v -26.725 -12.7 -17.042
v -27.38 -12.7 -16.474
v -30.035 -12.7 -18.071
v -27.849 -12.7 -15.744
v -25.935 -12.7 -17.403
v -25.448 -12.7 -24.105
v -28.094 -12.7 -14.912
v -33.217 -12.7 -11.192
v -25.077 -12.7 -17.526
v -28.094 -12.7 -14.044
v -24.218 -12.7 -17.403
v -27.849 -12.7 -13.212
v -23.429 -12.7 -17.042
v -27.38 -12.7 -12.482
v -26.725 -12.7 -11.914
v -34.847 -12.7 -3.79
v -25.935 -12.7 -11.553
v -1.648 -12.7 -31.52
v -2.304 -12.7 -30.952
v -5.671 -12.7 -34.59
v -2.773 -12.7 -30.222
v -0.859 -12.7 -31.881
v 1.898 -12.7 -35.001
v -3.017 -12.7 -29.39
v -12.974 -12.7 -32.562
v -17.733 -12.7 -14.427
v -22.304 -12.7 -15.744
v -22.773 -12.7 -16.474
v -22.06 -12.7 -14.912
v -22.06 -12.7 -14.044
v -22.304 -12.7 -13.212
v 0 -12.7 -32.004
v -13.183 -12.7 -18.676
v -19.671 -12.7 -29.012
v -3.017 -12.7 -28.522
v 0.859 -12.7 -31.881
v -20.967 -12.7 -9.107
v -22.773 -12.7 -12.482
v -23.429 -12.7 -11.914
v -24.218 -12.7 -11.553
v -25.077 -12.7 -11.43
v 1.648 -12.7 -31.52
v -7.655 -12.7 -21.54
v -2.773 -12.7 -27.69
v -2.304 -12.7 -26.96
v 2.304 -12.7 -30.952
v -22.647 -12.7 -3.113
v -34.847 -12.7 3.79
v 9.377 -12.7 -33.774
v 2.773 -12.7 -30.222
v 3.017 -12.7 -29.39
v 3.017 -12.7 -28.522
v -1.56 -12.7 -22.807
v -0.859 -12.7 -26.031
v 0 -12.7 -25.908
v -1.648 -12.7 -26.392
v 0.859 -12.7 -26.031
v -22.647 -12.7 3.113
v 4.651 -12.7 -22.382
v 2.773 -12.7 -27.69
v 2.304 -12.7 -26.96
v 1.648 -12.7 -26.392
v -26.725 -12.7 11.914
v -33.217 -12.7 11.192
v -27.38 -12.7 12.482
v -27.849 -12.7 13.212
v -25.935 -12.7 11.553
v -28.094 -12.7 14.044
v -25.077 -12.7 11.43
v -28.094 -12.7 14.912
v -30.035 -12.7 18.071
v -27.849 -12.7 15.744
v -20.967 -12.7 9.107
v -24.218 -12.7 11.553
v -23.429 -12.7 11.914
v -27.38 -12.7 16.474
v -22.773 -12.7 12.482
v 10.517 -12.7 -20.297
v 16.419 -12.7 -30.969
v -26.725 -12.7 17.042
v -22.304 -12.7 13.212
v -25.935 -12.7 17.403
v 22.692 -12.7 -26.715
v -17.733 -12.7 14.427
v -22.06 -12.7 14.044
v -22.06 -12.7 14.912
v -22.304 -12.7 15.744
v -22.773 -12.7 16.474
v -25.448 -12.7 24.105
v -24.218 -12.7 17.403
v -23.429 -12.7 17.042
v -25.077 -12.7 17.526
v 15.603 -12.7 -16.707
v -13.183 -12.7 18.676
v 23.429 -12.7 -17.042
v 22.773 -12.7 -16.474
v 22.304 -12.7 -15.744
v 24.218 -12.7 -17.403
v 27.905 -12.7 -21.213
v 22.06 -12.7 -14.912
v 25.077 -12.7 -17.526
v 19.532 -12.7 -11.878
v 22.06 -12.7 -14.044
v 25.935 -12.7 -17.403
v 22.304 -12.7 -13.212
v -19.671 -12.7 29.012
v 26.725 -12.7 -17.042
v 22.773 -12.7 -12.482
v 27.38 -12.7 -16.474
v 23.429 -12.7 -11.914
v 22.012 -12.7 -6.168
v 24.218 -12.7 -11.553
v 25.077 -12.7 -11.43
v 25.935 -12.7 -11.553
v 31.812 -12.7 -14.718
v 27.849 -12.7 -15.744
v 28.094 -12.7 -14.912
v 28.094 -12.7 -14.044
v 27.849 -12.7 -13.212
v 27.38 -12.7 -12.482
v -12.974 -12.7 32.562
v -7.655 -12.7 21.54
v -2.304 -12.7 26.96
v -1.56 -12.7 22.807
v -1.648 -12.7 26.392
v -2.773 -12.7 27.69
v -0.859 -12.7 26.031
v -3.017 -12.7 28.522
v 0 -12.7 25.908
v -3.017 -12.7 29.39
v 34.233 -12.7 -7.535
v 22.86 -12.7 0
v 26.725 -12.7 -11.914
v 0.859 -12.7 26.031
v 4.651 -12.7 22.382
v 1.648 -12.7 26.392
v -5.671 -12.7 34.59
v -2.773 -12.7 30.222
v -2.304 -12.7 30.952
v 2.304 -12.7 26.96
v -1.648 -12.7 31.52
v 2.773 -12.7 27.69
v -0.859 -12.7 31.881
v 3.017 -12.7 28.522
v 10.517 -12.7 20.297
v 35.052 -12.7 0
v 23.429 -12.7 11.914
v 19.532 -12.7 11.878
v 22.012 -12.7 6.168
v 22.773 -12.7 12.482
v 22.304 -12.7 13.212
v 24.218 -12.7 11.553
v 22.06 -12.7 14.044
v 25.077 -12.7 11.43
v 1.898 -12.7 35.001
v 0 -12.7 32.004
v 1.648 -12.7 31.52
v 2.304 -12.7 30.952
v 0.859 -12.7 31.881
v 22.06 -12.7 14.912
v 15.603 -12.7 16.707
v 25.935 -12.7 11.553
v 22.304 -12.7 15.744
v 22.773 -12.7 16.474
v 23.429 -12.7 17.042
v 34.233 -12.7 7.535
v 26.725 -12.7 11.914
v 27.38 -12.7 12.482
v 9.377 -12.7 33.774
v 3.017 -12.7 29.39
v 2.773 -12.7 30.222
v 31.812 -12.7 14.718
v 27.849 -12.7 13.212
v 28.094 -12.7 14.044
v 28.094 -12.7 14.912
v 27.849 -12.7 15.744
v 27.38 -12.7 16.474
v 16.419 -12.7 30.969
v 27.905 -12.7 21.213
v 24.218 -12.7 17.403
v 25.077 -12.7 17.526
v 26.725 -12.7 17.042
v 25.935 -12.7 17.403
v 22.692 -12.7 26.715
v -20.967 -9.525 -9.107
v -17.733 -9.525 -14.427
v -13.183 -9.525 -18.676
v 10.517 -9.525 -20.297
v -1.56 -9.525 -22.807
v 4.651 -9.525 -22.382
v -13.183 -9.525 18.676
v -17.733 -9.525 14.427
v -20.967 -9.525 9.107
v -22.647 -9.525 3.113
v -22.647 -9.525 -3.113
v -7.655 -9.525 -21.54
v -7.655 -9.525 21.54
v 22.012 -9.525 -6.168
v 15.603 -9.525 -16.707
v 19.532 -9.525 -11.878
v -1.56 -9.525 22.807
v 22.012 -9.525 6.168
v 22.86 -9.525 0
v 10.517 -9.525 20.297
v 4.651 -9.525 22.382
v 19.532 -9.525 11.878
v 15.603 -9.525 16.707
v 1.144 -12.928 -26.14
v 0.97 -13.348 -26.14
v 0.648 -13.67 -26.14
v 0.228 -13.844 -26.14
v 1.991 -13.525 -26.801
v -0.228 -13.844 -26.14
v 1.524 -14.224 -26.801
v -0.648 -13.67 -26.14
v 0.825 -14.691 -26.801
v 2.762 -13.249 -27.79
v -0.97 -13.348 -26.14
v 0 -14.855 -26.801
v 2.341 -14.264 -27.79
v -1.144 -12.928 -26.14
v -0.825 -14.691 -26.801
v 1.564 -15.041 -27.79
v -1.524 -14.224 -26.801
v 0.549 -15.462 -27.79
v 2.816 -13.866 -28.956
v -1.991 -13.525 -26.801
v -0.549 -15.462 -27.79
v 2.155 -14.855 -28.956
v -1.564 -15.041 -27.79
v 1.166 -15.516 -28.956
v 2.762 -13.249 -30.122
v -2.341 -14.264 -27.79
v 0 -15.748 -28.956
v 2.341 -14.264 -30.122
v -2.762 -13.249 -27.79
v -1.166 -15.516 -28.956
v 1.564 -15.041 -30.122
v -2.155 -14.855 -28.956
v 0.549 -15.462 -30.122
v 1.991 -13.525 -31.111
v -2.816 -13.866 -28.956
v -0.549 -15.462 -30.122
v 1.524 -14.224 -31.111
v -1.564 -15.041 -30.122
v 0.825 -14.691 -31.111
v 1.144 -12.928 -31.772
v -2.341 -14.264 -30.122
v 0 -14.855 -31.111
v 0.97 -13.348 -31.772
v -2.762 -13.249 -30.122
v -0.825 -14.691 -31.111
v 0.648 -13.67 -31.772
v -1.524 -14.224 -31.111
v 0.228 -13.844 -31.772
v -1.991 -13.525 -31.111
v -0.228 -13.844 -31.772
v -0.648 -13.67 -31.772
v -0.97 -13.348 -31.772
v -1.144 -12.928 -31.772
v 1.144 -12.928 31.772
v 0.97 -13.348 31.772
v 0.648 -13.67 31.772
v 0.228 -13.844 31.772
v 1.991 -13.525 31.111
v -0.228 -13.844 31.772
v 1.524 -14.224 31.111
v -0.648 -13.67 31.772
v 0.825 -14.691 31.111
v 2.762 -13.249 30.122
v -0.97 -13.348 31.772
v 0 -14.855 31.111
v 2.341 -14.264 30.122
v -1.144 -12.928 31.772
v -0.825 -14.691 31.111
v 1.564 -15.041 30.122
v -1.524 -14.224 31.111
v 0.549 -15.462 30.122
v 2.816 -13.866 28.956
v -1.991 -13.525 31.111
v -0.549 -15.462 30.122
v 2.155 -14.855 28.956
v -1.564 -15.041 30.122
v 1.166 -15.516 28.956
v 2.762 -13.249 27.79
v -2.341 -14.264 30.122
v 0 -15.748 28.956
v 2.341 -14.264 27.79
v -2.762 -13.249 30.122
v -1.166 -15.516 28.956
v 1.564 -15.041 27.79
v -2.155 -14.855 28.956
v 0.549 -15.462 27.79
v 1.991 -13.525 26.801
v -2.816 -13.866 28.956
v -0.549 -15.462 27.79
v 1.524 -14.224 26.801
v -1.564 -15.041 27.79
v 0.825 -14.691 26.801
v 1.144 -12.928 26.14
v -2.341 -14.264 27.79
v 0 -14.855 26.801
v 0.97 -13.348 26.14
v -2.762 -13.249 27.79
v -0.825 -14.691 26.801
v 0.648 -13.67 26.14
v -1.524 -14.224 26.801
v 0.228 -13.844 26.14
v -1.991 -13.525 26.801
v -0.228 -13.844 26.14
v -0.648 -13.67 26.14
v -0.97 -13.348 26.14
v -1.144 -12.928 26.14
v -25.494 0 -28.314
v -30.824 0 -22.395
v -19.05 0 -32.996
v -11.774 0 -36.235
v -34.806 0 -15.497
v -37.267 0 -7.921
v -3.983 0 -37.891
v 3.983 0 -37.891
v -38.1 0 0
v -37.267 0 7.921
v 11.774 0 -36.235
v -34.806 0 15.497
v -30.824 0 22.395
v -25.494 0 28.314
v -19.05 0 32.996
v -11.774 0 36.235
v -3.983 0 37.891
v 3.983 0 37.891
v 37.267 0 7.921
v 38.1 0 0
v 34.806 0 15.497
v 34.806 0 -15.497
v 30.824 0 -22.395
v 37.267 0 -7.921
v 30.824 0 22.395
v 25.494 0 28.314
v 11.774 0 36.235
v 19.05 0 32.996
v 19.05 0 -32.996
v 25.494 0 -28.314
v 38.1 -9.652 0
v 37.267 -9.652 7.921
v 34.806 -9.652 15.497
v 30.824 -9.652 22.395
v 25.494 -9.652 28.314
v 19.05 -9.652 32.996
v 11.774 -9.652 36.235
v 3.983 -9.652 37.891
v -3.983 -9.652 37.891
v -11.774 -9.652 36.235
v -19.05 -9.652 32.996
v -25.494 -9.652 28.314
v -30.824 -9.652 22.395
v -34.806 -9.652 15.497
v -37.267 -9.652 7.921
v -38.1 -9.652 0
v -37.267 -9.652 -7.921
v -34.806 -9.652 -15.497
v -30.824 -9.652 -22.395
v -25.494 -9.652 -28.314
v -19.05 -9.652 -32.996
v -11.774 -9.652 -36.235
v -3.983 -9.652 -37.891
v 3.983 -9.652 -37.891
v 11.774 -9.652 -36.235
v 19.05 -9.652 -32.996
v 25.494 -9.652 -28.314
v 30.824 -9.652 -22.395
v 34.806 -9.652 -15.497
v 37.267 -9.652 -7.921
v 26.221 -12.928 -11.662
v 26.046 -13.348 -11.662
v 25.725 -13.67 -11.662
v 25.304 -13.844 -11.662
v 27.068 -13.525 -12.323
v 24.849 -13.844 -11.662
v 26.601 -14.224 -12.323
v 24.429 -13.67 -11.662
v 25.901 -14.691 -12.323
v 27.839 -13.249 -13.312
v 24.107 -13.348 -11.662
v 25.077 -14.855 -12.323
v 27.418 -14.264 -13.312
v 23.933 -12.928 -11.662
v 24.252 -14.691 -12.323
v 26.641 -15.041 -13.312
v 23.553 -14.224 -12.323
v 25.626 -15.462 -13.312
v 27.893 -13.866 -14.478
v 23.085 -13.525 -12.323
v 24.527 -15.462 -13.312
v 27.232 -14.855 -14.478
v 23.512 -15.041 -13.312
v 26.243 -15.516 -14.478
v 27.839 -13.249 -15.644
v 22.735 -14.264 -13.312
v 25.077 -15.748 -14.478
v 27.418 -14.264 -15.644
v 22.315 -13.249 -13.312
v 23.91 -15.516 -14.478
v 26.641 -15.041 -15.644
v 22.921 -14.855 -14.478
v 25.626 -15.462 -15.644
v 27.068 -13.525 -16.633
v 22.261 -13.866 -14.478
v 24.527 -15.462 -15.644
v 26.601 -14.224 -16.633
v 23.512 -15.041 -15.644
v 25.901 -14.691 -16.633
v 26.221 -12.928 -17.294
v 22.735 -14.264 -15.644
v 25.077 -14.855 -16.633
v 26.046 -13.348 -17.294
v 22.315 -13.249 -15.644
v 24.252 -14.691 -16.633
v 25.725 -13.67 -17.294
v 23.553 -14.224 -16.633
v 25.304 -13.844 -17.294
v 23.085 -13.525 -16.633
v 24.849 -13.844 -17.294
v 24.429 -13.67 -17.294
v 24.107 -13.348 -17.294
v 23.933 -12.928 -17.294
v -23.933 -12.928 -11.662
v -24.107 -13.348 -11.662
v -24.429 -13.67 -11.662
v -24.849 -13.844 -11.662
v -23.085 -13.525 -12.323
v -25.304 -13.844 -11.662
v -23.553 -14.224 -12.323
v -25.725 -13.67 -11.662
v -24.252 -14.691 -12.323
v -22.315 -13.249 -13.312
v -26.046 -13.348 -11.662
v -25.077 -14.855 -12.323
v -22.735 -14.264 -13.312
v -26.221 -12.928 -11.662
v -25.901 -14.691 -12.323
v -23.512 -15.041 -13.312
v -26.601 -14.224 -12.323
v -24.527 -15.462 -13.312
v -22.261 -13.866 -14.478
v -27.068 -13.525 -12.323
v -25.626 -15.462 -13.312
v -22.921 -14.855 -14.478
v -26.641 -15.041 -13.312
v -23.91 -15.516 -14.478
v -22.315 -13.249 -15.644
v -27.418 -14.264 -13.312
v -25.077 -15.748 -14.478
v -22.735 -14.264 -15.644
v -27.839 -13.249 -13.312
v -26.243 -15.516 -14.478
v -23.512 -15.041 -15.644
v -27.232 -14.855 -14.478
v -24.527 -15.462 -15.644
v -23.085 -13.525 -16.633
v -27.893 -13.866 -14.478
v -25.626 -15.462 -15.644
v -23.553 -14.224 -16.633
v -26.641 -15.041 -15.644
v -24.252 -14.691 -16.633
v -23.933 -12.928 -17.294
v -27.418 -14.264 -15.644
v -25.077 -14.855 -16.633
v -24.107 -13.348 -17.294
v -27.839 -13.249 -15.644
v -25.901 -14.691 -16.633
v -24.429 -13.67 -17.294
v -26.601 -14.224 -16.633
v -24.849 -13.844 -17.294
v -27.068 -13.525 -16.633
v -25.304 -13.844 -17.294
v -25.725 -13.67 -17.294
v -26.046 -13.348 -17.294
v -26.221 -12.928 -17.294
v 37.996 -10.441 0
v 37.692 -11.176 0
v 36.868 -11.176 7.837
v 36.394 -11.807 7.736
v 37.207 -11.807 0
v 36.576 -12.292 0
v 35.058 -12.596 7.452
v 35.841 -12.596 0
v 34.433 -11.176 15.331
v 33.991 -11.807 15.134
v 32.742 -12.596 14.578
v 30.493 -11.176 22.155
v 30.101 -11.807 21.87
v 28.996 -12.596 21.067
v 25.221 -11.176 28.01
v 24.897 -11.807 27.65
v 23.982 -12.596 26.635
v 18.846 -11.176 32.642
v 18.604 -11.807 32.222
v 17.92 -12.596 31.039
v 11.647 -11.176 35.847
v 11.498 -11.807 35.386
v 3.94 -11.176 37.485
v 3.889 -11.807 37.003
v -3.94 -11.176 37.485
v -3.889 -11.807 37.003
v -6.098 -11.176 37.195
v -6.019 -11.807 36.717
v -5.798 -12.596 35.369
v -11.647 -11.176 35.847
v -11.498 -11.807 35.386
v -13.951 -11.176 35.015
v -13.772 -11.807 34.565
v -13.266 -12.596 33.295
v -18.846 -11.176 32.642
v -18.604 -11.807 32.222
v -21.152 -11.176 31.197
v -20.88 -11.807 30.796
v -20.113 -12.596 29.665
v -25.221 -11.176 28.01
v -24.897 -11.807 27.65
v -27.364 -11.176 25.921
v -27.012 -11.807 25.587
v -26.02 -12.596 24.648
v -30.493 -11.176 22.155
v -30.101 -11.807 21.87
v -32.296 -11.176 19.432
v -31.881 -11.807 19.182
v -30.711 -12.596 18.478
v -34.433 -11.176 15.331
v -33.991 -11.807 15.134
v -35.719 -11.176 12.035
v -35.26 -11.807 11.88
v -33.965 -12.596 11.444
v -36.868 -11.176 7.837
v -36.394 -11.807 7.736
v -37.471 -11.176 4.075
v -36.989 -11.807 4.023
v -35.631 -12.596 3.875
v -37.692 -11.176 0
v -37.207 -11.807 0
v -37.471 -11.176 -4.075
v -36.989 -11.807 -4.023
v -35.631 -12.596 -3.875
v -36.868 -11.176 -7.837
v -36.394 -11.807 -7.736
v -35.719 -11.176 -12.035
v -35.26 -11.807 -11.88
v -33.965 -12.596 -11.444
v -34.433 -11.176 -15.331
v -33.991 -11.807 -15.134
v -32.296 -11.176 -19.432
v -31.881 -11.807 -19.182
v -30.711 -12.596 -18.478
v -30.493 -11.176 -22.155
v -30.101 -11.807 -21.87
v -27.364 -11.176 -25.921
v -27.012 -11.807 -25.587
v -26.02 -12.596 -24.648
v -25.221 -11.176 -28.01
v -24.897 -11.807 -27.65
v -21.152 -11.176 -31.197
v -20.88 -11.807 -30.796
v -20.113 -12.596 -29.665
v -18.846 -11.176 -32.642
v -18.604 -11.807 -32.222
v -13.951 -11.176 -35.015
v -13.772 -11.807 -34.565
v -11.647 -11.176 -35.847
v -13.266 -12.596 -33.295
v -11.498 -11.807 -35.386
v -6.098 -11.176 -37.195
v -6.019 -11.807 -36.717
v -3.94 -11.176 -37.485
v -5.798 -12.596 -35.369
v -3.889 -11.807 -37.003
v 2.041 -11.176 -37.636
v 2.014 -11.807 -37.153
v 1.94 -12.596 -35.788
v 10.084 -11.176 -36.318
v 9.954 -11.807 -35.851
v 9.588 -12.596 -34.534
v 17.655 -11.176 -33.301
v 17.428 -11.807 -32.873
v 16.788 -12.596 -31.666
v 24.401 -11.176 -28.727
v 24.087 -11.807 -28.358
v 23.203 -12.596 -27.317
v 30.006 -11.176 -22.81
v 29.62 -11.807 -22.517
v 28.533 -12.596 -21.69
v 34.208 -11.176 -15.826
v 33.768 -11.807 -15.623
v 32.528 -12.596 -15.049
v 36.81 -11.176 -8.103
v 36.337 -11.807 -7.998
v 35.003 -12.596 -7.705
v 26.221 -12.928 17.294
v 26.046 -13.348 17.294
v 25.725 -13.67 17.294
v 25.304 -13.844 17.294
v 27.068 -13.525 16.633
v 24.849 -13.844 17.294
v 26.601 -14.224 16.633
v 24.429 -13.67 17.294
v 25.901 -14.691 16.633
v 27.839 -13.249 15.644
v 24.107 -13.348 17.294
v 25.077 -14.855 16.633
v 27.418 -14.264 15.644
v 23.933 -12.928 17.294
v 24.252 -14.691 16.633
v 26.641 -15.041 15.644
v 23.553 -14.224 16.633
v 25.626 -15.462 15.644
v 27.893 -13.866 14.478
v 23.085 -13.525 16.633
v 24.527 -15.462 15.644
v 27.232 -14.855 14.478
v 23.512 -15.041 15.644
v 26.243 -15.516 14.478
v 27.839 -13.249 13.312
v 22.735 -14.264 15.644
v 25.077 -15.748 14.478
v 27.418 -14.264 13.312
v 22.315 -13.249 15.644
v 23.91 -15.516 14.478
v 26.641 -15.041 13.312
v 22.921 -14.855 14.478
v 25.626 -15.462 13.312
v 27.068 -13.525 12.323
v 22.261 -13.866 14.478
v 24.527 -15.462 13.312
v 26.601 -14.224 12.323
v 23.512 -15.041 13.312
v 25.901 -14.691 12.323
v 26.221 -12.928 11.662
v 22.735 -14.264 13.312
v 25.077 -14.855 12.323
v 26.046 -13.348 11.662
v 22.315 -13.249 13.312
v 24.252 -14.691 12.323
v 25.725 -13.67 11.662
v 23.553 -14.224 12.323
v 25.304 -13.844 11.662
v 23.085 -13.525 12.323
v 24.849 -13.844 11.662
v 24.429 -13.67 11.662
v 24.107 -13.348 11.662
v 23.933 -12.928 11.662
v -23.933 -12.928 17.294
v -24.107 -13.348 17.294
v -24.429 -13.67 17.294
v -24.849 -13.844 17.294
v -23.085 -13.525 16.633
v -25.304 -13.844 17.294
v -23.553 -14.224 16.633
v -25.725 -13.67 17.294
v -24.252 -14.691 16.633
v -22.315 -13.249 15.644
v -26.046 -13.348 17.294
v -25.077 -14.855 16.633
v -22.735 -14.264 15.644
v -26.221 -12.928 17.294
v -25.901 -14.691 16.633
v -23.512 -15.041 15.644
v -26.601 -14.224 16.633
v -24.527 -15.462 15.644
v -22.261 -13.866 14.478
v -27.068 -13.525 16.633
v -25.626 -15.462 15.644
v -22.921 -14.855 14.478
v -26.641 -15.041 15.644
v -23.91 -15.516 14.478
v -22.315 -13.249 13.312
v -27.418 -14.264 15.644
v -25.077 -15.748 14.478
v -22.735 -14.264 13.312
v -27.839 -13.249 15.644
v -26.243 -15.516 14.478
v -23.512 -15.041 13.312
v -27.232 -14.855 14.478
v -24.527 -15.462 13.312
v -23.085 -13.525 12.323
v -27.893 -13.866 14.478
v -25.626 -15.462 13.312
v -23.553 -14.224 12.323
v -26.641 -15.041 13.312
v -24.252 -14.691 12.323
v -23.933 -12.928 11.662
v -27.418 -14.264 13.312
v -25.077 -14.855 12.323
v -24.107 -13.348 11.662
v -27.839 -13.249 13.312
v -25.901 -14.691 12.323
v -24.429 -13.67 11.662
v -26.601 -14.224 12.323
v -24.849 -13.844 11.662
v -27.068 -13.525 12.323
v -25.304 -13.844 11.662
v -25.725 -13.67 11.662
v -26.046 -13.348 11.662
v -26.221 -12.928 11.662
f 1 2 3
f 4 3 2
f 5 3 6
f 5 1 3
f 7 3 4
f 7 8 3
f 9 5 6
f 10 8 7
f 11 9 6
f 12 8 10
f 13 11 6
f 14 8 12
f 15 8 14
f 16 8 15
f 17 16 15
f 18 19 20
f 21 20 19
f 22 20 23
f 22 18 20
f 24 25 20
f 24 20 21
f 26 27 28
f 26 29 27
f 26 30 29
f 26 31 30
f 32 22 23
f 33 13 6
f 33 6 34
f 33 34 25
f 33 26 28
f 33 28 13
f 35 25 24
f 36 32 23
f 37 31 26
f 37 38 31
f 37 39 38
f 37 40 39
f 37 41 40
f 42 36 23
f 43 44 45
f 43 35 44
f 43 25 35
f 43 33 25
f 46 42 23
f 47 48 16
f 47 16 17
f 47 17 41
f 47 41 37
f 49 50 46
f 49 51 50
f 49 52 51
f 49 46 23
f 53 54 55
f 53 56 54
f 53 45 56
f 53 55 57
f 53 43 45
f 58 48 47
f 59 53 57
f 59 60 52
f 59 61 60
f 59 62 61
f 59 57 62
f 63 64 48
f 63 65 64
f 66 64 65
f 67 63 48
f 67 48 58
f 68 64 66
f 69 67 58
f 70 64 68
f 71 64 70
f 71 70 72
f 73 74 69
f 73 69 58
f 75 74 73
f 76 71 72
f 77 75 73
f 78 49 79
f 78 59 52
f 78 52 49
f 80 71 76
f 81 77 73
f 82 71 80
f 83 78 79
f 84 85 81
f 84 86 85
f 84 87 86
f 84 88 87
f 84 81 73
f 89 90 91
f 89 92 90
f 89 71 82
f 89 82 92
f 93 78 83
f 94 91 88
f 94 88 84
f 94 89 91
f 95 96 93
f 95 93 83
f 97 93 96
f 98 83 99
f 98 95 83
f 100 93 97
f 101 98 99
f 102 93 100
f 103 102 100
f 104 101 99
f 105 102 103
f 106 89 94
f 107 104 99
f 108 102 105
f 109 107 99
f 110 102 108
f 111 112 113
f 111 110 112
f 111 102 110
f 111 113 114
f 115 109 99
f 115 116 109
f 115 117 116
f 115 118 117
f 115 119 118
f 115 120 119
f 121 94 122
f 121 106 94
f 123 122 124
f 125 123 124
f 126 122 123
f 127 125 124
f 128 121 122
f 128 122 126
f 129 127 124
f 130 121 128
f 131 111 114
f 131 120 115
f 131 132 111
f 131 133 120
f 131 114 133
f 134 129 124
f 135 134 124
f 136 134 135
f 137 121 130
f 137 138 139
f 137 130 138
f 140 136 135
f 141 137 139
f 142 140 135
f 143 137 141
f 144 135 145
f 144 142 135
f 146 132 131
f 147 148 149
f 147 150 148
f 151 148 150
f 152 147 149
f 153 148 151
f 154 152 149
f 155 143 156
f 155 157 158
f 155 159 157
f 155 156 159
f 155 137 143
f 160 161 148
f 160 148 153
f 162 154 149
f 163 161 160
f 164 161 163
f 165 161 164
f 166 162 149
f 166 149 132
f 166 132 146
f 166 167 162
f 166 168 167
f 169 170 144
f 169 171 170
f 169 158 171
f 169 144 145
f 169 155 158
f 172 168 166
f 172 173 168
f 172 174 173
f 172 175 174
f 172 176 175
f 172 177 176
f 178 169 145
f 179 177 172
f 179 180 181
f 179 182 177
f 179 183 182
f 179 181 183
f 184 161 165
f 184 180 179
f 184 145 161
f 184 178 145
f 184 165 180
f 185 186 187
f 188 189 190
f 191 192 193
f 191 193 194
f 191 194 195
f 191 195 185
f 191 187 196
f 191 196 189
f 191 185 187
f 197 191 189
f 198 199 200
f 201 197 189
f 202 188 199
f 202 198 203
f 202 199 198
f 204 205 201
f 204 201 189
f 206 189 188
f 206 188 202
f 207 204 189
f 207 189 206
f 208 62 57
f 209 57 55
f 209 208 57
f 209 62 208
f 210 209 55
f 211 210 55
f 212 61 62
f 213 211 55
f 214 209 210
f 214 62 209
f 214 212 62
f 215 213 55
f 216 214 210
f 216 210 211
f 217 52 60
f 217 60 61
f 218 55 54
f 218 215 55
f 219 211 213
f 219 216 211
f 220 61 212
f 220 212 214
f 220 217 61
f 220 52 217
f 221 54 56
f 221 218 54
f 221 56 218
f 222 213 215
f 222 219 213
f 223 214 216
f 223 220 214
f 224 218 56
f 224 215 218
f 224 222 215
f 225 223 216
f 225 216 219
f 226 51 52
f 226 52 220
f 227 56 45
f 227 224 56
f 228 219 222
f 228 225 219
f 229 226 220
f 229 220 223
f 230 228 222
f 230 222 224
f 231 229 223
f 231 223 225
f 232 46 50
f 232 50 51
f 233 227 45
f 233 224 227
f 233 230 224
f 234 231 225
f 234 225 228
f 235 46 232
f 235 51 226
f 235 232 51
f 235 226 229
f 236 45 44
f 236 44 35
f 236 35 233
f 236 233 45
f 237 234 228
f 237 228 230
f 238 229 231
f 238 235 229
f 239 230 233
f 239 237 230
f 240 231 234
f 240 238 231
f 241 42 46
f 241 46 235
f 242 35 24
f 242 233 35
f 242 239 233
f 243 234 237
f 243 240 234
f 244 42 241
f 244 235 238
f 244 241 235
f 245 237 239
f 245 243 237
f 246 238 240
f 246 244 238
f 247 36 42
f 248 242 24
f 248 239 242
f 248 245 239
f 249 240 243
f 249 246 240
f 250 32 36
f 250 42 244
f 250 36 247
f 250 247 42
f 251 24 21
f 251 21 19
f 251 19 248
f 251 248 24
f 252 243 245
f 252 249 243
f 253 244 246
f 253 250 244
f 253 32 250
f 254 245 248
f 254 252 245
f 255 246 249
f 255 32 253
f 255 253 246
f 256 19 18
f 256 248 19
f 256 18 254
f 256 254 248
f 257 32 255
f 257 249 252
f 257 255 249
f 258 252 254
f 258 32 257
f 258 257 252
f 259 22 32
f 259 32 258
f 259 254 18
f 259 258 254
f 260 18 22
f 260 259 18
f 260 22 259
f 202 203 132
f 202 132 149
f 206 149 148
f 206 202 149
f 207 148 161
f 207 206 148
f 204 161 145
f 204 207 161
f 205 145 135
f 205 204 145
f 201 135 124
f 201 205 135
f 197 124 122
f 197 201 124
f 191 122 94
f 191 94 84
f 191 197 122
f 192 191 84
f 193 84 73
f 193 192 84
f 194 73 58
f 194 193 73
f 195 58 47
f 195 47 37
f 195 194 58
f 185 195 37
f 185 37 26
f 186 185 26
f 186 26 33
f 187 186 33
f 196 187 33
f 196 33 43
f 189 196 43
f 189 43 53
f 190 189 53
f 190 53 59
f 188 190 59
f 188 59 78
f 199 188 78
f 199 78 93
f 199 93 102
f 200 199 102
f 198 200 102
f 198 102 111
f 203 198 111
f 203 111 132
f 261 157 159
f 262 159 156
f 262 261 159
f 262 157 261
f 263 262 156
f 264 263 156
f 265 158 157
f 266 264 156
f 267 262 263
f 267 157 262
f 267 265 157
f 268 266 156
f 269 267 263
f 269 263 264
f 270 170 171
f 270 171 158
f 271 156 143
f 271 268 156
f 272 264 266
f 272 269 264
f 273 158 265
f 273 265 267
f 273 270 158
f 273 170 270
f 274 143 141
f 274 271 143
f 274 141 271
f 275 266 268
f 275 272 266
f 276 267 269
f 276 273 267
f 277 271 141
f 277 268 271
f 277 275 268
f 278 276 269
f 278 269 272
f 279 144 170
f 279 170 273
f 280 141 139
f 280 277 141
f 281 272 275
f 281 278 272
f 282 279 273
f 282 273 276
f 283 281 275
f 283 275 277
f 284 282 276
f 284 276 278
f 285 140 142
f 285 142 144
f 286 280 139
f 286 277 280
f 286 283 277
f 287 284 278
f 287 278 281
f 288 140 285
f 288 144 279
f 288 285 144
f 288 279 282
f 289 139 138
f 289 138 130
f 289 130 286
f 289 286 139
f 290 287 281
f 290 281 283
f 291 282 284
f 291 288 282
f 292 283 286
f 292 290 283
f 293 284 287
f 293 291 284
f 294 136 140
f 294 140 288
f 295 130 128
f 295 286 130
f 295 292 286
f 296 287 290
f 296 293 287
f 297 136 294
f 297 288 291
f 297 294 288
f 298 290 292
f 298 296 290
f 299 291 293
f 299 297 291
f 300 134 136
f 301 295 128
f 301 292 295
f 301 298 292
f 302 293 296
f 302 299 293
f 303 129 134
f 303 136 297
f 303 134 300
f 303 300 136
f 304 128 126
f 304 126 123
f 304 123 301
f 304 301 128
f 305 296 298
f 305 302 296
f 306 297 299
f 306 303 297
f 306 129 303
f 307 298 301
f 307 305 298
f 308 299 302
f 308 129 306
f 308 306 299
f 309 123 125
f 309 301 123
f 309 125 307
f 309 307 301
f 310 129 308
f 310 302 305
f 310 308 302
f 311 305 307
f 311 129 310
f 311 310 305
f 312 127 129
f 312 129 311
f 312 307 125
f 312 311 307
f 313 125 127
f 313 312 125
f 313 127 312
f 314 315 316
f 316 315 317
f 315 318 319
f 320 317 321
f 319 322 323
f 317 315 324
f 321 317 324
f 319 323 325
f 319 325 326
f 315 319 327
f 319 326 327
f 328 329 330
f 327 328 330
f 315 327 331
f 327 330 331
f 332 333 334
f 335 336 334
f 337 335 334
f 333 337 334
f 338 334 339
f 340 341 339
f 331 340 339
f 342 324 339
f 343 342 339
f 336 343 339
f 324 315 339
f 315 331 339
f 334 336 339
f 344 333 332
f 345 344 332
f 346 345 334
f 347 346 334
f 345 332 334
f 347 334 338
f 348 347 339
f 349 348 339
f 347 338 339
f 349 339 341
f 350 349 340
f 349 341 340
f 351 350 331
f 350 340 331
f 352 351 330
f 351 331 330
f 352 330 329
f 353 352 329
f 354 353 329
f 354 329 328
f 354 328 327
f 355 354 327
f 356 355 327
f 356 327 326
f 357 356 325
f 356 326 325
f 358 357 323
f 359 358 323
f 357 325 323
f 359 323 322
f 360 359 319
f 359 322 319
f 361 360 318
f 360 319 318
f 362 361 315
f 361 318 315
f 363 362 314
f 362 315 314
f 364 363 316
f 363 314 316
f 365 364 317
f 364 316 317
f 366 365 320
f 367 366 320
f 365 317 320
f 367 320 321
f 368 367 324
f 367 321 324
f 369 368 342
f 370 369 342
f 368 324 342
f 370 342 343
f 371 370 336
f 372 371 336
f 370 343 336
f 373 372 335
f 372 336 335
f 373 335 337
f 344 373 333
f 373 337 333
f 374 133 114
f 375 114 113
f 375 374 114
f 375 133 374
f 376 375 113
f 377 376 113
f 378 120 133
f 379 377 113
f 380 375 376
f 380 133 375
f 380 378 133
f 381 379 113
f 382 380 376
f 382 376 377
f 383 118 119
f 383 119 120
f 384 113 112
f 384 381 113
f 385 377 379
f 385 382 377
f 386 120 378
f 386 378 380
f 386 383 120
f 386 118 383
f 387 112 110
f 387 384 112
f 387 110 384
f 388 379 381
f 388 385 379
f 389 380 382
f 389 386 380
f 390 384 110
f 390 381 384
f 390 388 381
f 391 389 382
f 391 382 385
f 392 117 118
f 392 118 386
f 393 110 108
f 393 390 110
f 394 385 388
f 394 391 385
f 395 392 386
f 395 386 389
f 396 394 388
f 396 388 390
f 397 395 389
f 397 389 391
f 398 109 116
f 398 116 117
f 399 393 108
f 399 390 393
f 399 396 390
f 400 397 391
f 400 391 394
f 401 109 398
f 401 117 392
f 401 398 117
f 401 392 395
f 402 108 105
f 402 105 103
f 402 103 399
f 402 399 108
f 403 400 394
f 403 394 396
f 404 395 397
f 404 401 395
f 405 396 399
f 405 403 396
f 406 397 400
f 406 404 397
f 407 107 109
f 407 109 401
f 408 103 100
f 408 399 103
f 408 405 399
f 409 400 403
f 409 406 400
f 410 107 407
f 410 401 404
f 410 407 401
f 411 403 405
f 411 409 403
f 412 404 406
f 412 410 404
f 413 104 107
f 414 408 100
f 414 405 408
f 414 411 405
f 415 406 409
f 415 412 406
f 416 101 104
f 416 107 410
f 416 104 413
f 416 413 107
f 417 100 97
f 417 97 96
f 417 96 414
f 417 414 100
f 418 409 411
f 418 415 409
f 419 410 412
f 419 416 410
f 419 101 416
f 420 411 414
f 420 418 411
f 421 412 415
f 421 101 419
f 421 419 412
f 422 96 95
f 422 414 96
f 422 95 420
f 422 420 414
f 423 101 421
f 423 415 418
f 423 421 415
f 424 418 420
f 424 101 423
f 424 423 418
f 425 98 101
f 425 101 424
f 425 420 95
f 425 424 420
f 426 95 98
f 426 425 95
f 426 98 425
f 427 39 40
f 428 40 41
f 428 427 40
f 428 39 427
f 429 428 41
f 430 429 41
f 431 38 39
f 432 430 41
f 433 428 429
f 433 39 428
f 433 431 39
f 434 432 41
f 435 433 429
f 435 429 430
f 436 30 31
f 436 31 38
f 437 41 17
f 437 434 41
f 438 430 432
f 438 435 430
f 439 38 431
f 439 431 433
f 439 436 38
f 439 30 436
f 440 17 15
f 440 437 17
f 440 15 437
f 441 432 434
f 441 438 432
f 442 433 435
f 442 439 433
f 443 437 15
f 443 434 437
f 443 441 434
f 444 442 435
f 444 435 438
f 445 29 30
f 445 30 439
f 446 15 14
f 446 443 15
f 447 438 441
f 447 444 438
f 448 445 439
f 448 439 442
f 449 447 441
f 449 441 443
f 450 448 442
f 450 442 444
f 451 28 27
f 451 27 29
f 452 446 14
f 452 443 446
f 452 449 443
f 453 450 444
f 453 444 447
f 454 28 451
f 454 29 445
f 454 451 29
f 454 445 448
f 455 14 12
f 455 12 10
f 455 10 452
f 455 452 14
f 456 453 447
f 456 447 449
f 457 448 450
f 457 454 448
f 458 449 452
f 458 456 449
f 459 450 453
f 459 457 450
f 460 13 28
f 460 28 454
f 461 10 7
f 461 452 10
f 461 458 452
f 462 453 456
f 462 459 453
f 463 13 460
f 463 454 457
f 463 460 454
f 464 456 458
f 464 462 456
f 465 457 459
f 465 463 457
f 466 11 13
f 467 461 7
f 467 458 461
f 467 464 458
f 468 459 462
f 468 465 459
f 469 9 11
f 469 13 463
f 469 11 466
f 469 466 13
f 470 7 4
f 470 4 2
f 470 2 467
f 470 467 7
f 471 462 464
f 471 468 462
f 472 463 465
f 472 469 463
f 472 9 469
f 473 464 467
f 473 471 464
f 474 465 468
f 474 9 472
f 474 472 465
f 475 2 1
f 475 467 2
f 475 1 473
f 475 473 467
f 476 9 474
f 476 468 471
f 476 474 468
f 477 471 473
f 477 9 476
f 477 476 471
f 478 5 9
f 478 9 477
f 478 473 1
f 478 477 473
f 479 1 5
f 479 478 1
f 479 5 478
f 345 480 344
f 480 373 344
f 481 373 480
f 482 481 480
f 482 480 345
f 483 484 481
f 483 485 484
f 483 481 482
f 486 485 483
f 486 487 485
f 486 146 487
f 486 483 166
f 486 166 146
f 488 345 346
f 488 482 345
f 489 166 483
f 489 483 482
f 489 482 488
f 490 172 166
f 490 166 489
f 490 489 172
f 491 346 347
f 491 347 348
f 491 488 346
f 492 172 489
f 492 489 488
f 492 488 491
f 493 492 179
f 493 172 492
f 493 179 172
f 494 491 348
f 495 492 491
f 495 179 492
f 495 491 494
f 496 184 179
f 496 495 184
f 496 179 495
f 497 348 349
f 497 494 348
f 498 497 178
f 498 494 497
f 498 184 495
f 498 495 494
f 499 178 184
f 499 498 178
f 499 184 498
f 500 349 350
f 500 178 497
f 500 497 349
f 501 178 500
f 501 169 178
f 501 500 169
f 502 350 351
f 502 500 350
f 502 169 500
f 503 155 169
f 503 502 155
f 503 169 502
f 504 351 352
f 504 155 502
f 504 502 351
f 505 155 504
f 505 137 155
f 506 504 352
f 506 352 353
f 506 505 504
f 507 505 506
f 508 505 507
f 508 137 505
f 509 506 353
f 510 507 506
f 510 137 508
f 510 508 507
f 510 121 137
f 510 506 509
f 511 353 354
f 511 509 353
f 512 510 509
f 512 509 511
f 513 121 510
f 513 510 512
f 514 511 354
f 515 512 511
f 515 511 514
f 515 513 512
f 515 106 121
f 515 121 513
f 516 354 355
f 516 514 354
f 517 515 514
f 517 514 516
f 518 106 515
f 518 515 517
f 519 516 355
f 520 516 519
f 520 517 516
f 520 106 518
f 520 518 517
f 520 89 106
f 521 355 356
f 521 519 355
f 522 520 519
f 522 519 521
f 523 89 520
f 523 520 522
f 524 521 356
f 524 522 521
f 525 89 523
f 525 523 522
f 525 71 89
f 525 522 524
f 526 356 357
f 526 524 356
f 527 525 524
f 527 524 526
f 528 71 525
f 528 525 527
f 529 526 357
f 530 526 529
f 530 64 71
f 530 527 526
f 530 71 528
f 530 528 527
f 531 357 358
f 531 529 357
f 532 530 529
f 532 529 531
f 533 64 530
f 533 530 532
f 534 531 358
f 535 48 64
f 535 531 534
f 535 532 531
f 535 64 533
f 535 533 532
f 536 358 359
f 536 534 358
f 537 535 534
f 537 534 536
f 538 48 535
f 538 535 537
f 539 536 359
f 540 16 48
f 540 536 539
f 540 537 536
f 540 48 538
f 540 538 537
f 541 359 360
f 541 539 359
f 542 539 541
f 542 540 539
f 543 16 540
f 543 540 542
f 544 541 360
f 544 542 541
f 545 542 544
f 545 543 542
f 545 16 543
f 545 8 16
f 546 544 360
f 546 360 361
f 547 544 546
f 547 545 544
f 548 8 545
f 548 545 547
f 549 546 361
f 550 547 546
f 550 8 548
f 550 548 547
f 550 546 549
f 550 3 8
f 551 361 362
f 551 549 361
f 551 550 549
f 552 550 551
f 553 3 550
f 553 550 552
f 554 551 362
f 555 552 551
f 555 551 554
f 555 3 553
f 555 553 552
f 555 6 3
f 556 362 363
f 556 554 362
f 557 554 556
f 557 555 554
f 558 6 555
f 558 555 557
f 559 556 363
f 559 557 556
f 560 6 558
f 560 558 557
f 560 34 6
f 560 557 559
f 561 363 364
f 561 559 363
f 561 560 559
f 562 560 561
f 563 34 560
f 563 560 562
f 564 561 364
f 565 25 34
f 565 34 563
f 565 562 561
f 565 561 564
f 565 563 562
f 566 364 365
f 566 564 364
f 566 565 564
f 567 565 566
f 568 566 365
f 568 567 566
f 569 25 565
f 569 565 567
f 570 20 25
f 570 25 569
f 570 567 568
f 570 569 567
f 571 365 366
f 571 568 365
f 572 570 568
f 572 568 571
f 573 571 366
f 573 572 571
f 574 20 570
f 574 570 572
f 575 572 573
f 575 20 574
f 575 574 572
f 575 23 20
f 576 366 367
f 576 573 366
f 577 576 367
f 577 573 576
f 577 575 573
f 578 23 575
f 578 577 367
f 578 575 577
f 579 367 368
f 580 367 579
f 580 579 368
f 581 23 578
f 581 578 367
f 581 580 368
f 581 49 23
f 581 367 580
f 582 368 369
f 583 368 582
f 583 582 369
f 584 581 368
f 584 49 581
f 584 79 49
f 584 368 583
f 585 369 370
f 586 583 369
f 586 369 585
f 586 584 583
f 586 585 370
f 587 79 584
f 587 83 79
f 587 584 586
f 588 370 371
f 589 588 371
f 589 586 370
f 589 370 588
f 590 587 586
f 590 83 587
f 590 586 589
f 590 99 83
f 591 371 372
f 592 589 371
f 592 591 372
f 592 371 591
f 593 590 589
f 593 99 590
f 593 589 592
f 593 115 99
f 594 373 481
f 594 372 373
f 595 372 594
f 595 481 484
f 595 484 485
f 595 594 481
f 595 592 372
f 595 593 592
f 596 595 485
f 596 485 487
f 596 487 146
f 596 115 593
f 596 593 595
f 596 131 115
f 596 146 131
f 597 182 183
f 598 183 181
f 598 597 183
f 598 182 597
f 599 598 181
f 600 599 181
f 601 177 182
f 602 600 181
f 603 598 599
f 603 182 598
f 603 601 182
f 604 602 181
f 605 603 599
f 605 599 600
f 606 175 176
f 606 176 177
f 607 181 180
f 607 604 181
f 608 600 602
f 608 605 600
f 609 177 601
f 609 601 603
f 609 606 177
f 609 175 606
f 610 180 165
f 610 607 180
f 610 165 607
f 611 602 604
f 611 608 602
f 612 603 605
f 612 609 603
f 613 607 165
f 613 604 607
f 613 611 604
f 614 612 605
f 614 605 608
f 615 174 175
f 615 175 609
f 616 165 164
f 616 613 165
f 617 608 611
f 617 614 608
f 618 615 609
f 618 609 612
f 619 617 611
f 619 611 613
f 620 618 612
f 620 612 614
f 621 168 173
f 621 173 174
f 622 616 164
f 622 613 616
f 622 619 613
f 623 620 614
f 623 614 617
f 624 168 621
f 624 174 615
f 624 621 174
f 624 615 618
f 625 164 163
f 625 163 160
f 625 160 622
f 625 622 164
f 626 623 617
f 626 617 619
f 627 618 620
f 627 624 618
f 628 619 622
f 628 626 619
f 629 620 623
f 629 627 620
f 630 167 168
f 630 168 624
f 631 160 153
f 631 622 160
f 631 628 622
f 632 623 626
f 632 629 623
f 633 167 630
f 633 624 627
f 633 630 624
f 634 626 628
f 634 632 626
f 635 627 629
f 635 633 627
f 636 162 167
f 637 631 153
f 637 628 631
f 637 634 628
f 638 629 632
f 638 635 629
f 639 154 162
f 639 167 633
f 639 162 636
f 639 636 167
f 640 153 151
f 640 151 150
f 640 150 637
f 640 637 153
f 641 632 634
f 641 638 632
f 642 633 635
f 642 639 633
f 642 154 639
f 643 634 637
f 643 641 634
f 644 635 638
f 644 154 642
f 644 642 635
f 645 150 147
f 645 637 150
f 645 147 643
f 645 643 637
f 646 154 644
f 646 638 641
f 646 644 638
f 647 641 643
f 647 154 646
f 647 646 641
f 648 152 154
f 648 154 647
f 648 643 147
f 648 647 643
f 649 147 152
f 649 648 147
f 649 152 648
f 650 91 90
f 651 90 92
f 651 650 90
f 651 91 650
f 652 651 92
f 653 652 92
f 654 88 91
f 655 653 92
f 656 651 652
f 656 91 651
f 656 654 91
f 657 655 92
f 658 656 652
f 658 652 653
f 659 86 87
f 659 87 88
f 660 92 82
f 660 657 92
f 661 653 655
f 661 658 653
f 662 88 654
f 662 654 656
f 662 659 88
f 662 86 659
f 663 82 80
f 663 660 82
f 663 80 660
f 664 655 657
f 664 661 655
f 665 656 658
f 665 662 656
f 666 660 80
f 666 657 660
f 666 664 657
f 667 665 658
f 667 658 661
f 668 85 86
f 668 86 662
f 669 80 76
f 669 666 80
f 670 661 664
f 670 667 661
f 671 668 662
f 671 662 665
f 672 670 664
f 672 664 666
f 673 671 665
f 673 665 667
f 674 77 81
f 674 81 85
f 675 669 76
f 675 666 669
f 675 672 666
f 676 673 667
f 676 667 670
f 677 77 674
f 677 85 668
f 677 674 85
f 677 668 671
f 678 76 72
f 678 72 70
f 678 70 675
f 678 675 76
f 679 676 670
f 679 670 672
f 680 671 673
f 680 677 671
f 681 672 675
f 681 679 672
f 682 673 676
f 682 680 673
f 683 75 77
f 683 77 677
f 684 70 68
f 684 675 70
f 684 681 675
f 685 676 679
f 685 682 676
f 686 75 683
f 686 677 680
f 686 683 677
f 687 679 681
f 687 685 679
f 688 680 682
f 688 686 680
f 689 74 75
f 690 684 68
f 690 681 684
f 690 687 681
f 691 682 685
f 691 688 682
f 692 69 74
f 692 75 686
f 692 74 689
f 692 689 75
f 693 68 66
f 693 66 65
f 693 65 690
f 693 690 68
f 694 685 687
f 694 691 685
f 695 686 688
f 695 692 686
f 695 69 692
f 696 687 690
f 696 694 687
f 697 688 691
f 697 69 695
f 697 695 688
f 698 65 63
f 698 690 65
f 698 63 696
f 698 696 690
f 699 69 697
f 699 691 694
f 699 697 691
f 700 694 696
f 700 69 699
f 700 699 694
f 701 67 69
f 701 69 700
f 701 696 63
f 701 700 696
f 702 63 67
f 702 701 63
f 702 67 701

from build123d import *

# Parameters (mm, degrees)
F0_R     = 38.1
F0_R_2   = 22.86
F1_DEPTH = 12.7
F2_R     = 3.048
F3_DEPTH = 9.525


with BuildPart() as f1:
    # F0 (on Front) → F1 (new body)
    with BuildSketch(Plane.XZ):
        Circle(F0_R)
        Circle(F0_R_2, mode=Mode.SUBTRACT)
    extrude(amount=F1_DEPTH)

    # F2
    f2_edges = [f1.edges().sort_by_distance(p)[0] for p in [
        (-38.1, -12.7, 0),
    ]]
    fillet(f2_edges, radius=F2_R)

    # F0 (on Front) → F3 (join)
    with BuildSketch(Plane.XZ):
        Circle(F0_R_2)
    extrude(amount=F3_DEPTH)

    # F4 (on face) → F5 (revolve)
    with BuildSketch(Plane.XZ.offset(12.7)):
        with BuildLine():
            Line((-25.076632, 11.43), (-25.076632, 17.526))
            ThreePointArc((-25.076632, 17.526), (-28.124632, 14.478), (-25.076632, 11.43))
        make_face()
        with BuildLine():
            Line((-25.076632, -17.526), (-25.076632, -11.43))
            ThreePointArc((-25.076632, -11.43), (-28.124632, -14.478), (-25.076632, -17.526))
        make_face()
    revolve(axis=Axis((-25.076632, -12.7, -0.637533), (0, 0, -1)))

    # F4 (on face) → F6 (revolve)
    with BuildSketch(Plane.XZ.offset(12.7)):
        with BuildLine():
            Line((0, 25.908), (0, 32.004))
            ThreePointArc((0, 32.004), (-3.048, 28.956), (0, 25.908))
        make_face()
        with BuildLine():
            Line((0, -32.004), (0, -25.908))
            ThreePointArc((0, -25.908), (-3.048, -28.956), (0, -32.004))
        make_face()
    revolve(axis=Axis((0, -12.7, 0.300789), (0, 0, -1)))

    # F4 (on face) → F7 (revolve)
    with BuildSketch(Plane.XZ.offset(12.7)):
        with BuildLine():
            Line((25.076632, 11.43), (25.076632, 17.526))
            ThreePointArc((25.076632, 17.526), (22.028632, 14.478), (25.076632, 11.43))
        make_face()
        with BuildLine():
            Line((25.076632, -17.526), (25.076632, -11.43))
            ThreePointArc((25.076632, -11.43), (22.028632, -14.478), (25.076632, -17.526))
        make_face()
    revolve(axis=Axis((25.076632, -12.7, 0.300787), (0, 0, -1)))


solid = f1.part
